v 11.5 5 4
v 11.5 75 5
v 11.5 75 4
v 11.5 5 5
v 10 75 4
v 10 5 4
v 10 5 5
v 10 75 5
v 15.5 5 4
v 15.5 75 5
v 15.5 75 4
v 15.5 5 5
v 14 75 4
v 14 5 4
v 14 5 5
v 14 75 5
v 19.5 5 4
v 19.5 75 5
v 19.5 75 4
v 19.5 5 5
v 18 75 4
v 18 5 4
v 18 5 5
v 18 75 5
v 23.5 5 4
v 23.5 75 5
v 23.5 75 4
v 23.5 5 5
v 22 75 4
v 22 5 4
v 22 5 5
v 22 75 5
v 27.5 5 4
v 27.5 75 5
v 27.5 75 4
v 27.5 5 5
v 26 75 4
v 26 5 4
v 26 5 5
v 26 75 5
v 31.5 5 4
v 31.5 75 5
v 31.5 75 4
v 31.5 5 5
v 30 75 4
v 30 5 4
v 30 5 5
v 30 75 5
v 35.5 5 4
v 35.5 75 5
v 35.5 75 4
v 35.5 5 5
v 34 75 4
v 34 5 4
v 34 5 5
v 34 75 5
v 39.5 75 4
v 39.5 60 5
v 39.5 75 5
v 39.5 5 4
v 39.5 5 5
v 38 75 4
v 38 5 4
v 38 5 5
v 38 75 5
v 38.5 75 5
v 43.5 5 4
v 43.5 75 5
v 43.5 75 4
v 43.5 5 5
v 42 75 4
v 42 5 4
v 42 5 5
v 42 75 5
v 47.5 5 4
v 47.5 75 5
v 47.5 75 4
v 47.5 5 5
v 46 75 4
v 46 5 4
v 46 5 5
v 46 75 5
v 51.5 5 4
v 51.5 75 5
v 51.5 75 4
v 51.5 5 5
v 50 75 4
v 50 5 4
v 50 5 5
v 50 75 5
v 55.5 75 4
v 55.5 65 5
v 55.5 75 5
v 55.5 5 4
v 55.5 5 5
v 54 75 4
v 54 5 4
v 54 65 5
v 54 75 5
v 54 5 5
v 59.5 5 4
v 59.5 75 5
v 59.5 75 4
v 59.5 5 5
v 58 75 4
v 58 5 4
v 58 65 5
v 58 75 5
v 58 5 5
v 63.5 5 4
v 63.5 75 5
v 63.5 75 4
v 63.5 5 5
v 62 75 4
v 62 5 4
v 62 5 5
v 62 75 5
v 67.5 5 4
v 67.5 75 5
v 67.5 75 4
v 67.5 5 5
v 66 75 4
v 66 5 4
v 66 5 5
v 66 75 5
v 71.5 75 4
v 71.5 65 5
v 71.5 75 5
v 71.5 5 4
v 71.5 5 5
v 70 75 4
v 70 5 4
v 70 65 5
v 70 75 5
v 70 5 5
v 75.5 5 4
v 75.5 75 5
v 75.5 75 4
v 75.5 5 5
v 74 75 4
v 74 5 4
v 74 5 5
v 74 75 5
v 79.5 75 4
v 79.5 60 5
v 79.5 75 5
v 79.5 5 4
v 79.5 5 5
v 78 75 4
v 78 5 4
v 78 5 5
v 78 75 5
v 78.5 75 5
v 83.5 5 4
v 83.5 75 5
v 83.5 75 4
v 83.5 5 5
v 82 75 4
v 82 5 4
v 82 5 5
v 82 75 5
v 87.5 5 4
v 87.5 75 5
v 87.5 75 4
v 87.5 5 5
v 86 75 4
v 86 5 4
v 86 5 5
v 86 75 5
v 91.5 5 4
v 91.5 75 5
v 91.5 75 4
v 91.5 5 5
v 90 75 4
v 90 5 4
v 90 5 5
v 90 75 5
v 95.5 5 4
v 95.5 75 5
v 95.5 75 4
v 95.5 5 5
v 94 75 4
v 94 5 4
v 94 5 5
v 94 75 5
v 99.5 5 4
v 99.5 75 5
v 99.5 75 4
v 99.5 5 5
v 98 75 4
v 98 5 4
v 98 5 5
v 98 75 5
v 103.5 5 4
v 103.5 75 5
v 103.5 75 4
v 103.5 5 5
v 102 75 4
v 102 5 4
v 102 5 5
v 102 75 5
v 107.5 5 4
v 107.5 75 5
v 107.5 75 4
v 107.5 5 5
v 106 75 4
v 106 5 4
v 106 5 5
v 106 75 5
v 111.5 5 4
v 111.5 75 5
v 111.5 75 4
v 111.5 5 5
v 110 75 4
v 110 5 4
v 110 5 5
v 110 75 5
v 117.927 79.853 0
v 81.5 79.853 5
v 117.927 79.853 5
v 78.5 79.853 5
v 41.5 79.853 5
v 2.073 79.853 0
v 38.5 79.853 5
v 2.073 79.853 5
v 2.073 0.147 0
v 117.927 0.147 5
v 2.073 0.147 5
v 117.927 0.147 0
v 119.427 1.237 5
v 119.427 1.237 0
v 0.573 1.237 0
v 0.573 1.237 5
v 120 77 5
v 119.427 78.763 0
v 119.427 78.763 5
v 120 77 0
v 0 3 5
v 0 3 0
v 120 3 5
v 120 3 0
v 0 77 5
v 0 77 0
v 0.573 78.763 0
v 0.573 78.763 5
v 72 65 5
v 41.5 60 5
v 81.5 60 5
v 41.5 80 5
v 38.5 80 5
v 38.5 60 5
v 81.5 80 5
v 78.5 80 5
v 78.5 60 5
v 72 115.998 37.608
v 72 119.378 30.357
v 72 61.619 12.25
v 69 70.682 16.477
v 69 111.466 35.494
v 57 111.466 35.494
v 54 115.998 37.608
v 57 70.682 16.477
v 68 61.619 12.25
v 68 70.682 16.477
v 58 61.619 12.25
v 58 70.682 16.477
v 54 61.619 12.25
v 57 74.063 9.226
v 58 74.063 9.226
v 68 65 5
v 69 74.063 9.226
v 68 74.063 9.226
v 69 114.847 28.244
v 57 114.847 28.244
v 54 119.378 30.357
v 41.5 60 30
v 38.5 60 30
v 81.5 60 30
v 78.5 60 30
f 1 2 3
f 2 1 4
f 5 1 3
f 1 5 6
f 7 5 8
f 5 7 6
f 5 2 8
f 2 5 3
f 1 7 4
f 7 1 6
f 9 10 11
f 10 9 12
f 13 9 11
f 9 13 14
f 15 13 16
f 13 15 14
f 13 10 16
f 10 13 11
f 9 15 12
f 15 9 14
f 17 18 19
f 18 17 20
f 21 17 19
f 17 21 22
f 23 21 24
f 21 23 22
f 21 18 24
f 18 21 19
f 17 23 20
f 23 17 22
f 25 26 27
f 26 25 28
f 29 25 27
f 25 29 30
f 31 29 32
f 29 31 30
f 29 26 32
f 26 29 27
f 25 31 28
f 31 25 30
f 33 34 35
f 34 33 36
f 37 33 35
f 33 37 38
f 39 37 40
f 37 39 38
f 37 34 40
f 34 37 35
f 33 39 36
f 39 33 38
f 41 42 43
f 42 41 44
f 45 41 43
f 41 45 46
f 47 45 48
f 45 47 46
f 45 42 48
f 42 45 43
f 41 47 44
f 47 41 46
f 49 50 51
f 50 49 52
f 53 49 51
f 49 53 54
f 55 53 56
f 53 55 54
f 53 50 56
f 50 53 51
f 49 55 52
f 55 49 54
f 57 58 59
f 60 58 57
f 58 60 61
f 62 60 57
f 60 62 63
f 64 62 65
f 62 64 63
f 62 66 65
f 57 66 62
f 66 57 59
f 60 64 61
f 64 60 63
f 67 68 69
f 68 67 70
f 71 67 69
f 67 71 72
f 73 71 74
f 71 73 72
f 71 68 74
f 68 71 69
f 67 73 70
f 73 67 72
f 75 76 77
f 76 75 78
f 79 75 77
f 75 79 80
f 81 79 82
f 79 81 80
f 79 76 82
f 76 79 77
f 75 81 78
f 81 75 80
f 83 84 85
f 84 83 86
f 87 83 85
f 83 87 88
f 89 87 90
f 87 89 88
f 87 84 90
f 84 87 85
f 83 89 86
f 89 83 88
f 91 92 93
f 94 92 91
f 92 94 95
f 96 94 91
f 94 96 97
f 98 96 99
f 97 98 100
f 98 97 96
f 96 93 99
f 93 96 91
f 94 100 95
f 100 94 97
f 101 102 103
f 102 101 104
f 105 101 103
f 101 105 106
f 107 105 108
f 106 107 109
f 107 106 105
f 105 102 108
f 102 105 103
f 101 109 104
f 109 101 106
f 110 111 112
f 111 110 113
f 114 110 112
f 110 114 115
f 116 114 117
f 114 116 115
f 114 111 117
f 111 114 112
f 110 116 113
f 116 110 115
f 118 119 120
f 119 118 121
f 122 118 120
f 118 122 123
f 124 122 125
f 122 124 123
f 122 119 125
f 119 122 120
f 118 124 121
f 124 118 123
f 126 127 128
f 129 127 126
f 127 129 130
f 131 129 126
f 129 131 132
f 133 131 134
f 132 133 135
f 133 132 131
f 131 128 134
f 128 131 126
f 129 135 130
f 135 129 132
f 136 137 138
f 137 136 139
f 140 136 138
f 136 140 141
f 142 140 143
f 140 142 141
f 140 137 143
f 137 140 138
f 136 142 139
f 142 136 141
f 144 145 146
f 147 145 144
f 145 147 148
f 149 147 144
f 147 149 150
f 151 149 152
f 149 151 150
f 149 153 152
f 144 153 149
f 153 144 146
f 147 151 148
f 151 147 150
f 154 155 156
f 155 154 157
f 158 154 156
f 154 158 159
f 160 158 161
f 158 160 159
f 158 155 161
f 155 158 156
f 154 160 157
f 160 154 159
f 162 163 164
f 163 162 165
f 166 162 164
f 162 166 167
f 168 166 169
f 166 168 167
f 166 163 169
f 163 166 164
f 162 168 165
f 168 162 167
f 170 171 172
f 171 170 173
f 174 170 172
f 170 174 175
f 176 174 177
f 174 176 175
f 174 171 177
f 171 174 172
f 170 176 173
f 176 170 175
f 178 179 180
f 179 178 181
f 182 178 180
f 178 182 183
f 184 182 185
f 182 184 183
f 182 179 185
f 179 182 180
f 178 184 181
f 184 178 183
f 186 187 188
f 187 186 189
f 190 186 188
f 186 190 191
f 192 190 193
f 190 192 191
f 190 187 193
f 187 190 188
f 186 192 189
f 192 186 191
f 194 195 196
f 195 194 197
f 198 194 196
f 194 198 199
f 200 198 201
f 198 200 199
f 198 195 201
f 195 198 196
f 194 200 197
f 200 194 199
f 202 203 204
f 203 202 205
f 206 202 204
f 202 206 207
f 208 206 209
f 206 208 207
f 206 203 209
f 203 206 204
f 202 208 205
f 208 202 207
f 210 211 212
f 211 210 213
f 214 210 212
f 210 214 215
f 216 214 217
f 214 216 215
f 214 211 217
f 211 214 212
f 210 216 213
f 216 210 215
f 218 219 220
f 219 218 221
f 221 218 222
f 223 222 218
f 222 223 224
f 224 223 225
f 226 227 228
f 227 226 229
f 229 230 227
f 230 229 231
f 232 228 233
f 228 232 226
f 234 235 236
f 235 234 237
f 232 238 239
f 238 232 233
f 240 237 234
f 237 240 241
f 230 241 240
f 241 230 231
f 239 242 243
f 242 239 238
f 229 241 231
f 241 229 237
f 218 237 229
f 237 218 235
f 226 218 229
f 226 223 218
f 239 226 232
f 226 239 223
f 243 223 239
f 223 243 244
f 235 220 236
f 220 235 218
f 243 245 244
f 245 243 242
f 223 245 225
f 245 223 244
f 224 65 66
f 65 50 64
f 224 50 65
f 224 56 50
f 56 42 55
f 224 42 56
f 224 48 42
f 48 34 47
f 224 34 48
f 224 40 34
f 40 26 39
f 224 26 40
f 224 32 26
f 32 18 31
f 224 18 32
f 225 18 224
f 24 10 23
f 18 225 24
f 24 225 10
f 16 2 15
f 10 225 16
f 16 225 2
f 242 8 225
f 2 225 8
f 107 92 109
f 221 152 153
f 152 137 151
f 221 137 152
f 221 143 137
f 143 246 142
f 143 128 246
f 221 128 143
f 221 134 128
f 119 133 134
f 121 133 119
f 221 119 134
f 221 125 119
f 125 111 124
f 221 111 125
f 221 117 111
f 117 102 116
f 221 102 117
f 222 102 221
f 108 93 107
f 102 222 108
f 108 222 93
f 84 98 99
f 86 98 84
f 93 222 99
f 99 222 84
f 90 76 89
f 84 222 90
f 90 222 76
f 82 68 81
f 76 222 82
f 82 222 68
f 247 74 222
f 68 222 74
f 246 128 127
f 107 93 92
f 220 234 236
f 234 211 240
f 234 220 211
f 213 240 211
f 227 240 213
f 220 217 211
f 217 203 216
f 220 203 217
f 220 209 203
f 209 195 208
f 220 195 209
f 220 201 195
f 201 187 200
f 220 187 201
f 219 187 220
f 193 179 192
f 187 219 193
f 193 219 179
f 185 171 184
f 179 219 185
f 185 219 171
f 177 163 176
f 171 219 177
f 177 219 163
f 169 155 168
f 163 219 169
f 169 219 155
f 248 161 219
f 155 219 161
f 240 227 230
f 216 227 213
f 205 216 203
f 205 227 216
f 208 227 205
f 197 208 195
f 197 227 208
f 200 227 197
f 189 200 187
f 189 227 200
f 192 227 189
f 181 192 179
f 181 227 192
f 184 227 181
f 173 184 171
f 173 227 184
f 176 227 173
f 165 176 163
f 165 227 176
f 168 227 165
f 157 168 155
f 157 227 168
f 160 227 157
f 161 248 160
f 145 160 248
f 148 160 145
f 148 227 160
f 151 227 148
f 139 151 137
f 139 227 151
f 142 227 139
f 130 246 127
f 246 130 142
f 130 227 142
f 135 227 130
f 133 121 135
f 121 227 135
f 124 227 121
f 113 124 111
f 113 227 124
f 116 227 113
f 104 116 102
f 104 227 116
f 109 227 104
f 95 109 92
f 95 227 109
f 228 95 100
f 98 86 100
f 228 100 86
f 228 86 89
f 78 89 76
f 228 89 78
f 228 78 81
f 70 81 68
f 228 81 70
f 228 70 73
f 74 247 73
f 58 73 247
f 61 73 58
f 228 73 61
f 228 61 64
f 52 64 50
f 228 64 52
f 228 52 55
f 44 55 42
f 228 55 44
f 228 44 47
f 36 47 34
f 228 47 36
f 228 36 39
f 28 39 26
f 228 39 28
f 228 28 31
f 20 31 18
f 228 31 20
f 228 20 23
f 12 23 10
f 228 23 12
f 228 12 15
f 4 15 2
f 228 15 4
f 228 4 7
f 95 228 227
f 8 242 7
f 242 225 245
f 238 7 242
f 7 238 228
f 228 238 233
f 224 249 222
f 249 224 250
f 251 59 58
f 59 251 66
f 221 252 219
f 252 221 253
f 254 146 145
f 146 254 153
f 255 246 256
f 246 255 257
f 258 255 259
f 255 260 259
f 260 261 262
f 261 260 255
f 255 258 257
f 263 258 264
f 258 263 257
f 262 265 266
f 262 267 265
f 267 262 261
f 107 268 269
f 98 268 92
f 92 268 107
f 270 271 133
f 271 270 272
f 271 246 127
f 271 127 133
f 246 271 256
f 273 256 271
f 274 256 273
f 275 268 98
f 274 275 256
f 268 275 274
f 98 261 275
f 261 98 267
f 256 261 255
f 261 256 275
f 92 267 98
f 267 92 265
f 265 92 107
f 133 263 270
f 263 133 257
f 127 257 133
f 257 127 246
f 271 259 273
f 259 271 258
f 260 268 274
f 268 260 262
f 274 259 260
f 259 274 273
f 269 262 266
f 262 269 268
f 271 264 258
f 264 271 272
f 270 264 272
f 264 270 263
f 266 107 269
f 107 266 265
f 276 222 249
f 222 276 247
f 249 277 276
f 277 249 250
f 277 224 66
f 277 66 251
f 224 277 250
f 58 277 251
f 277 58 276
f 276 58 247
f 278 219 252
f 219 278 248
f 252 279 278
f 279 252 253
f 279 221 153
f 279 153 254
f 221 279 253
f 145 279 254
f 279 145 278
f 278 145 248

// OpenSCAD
// Adjustable Phone Stand
// A customizable phone stand for desk use
// Generated by FlexiCAD Designer

// Parameters - customize these values
base_width = 120;           // Width of the base
base_depth = 80;            // Depth of the base  
base_height = 5;            // Height of the base
angle = 65;                 // Viewing angle in degrees
phone_thickness = 12;       // Maximum phone thickness
support_height = 60;        // Height of back support
anti_slip_grooves = true;   // Add anti-slip grooves

// Calculated values
back_length = support_height / sin(angle);
groove_spacing = 4;

// Main assembly
phone_stand();

module phone_stand() {
    // Base platform
    difference() {
        // Main base
        rounded_cube([base_width, base_depth, base_height], 3);
        
        // Anti-slip grooves
        if (anti_slip_grooves) {
            for (i = [10 : groove_spacing : base_width - 10]) {
                translate([i, 5, base_height - 1])
                    cube([1.5, base_depth - 10, 2]);
            }
        }
    }
    
    // Back support
    translate([base_width/2 - phone_thickness/2, base_depth - 15, base_height]) {
        rotate([90 - angle, 0, 0]) {
            difference() {
                // Support back
                cube([phone_thickness + 6, support_height, 8]);
                
                // Phone slot
                translate([3, 10, -1])
                    cube([phone_thickness, support_height - 15, 10]);
                
                // Charging cable slot
                translate([phone_thickness/2 + 3 - 5, -1, -1])
                    cube([10, 12, 10]);
            }
        }
    }
    
    // Side supports for stability
    translate([base_width/2 - 20, base_depth - 20, base_height])
        support_triangle();
        
    translate([base_width/2 + 20, base_depth - 20, base_height])
        support_triangle();
}

// Support triangle for stability
module support_triangle() {
    rotate([0, -90, 0])
        linear_extrude(height = 3, center = true)
            polygon([[0, 0], [25, 0], [0, 20]]);
}

// Rounded cube module
module rounded_cube(size, radius) {
    hull() {
        translate([radius, radius, 0])
            cylinder(r = radius, h = size[2]);
        translate([size[0] - radius, radius, 0])
            cylinder(r = radius, h = size[2]);
        translate([radius, size[1] - radius, 0])
            cylinder(r = radius, h = size[2]);
        translate([size[0] - radius, size[1] - radius, 0])
            cylinder(r = radius, h = size[2]);
    }
}
